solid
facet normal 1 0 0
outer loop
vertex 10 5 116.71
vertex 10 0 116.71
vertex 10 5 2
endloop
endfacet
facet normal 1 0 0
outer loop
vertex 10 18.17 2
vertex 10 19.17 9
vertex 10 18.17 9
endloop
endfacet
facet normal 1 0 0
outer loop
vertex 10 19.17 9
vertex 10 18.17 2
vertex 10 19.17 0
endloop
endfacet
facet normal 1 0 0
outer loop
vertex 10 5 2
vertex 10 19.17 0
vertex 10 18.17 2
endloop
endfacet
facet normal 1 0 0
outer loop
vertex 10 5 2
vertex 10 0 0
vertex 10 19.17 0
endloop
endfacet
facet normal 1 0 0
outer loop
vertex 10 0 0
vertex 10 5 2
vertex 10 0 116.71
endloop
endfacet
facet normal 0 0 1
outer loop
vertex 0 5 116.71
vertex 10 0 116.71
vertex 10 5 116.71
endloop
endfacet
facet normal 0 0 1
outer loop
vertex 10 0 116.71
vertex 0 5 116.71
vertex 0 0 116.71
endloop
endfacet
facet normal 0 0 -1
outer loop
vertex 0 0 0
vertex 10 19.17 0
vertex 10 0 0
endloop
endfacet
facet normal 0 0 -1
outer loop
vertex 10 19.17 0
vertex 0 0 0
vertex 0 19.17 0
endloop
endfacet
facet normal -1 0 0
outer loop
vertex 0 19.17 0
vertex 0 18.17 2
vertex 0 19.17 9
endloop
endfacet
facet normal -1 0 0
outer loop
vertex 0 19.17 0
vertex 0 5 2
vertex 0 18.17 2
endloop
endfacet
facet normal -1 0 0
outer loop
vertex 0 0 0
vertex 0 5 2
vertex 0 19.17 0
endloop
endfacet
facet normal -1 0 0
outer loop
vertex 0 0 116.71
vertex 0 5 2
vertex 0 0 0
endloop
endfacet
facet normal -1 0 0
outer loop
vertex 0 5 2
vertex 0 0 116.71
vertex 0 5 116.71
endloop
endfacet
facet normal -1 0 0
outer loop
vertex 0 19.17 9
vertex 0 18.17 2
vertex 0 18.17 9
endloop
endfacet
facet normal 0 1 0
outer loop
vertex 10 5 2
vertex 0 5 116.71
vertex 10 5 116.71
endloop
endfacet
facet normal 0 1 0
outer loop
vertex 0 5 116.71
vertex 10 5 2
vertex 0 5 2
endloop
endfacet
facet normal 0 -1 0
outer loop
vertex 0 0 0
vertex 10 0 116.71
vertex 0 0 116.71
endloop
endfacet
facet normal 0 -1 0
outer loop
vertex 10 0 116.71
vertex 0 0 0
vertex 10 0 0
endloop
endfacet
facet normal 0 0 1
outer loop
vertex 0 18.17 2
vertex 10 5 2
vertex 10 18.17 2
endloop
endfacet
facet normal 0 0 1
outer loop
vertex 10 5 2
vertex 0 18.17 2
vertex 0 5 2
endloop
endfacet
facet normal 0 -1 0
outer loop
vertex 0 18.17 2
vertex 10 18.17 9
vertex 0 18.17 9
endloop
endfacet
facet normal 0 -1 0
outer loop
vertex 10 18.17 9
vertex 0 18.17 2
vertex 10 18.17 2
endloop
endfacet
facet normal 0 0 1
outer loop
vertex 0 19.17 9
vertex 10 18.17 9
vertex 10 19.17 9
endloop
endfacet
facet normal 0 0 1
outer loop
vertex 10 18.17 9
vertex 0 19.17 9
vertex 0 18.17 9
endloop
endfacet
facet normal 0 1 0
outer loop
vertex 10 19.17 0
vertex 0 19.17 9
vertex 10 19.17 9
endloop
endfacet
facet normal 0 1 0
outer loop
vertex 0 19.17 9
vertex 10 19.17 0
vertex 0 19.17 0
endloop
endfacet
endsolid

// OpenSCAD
// file: ../box_module/lock.scad
include <config.scad>
use <utils.scad>


module lock_piece(tolerance = 0, max_height = -1) {
    assert(max_height != 0 && max_height >= -1);

    width_big = lock_width/1.65*1.2;
    width_small = lock_width/1.65*0.75;
    width_max = lock_width;

    points = [
        [0, -(width_small + tolerance)/2, -lock_depth],
        [0,  (width_small + tolerance)/2, -lock_depth],
        [lock_depth + tolerance,  (width_big + tolerance)/2, 0],
        [lock_depth + tolerance, -(width_big + tolerance)/2, 0],
        [0, -(width_small + tolerance)/2, 4/5*lock_body_height],
        [0,  (width_small + tolerance)/2, 4/5*lock_body_height],
        [lock_depth + tolerance,  (width_big + tolerance)/2, 4/5*lock_body_height],
        [lock_depth + tolerance, -(width_big + tolerance)/2, 4/5*lock_body_height],
        [0, -(width_big + tolerance)/2, lock_body_height],
        [0,  (width_big + tolerance)/2, lock_body_height],
        [lock_depth + tolerance,  (width_max + tolerance)/2, lock_body_height],
        [lock_depth + tolerance, -(width_max + tolerance)/2, lock_body_height],
    ];
    faces = [
        [0,1,2,3],  // bottom
        [4,5,1,0],  // front
        //[7,6,5,4],  // top
        [5,6,2,1],  // right
        [6,7,3,2],  // back
        [7,4,0,3], // left
        [8,9,5,4], // top front
        [11,10,9,8], // top top
        [9,10,6,5], // top right
        [10,11,7,6], // top back
        [11,8,4,7], // top left
    ];

    if (max_height != -1 && max_height < lock_height) {
        translate([0, 0, max_height - lock_height]) difference() {
            translate([0, 0, lock_depth])  polyhedron(points, faces);

            translate([0, -(width_max + tolerance)/2, 0]) cube([lock_depth + tolerance, width_max + tolerance, lock_height + tolerance - max_height]);
        }
    } else if (max_height > lock_height) {
        translate([0, 0, max_height - lock_body_height]) polyhedron(points, faces);
    } else {
        translate([0, 0, lock_depth]) polyhedron(points, faces);
    }
}


module lock_deprecated(lock_groove = false, max_height = -1) {
    tolerance = (lock_groove == true) ? tolerance : 0;

    for (a = [-lock_distance : lock_distance : lock_distance]) {
        translate([0, a, 0])
          lock_piece(tolerance = tolerance, max_height = max_height);
    }
}


module lock_module(height = -1, length = default_length) {
    height = (height == -1) ? lock_height : height;
    height_move = max(height - lock_body_height - lock_depth, 0);
    length_true = length - 2*rounding;

    module final() {
        difference() {
            quickMinkowski(rounding) cube([lock_module_width_true, length_true, height - 2*rounding]);

            translate([lock_module_width, 0, 0]) cube([rounding, length, height]);
        }

        translate([lock_module_width, length/2, height_move]) lock(max_height = height);
    }

    final();
}


function lock_length(pieces = lock_pieces, padding = 2/3*lock_distance) =
    (pieces-1) * lock_distance + 2*padding;


module key(pieces = lock_pieces, height = -1, padding = 2/3*lock_distance) {
    length = lock_length(pieces, padding);

    module part() {
        for (a = [-length/2 + padding : lock_distance : length/2 - padding]) {
            translate([0, a, 0]) lock_piece(max_height = height);
        }
    }

    rotate([0, 0, 180]) part();
}


module lock(pieces = lock_pieces, height = -1, padding = 2/3*lock_distance) {
    length = lock_length(pieces, padding);

    module part() {
        for (a = [-length/2 + padding : lock_distance : length/2 - padding]) {
            translate([0, a, 0]) lock_piece(tolerance = tolerance, max_height = height);
        }
    }

    part();
}
// file: ../box_module/utils.scad
module quickMinkowski(rounding) {
    translate([rounding, rounding, rounding]) minkowski() {
        children();
        sphere(r=rounding);
    }
}

module box(a, thickness) {
    inner_box_width = a[0] - 2*thickness;
    inner_box_length = a[1] - 2*thickness;
    inner_box_height = a[2] - thickness;

    difference() {
        cube(a);

        translate([thickness, thickness, thickness]) cube([inner_box_width, inner_box_length, inner_box_height]);
    }
}

module box_inner_size(a, thickness) {
    outer_box_width = a[0] + 2*thickness;
    outer_box_length = a[1] + 2*thickness;
    outer_box_height = a[2] + thickness;

    difference() {
        cube([outer_box_width, outer_box_length, outer_box_height]);

        translate([thickness, thickness, thickness]) cube(a);
    }
}
// file: ../box_module/config.scad
$fs = 0.6;

// user defined parameters
default_length = 100;
plane_thickness = 5;
side_thickness = 4;
table_depth = 20;
table_thickness = 20;
round_corners = true;
screw_size = 10;

//system parameters
tolerance = 0.2;
lock_height = 24;
lock_depth = 2;
lock_width = 6.6;
lock_distance = 25;
lock_pieces = 3;
lock_module_width = 2;
rounding = 1.5;

// computed parameters
lock_body_height = lock_height - lock_depth;
default_length_true = default_length - 2*rounding;
plane_thickness_true = plane_thickness - 2*rounding;
side_thickness_true = side_thickness - rounding;
table_depth_true = table_depth;
handle_depth = table_depth + plane_thickness;
handle_height = 2*plane_thickness + table_thickness + 2*rounding;
screw_type = str("M",screw_size);
lock_module_width_true = lock_module_width - rounding;
// file: ../box_module/Round-Anything/MinkowskiRound.scad
Skip to content
Search or jump to…

Pull requests
Issues
Marketplace
Explore
 
@TLC123 
Irev-Dev
/
Round-Anything
11
15915
Code
Issues
2
Pull requests
Discussions
Actions
Projects
Wiki
Security
Insights
Round-Anything/MinkowskiRound.scad

Kurt Hutten Mostly renaming for readability
Latest commit f4a75dd on 5 Aug 2020
 History
 1 contributor
113 lines (101 sloc)  3.56 KB
  
// Library: MinkowskiRound.scad
// Version: 1.0
// Author: IrevDev
// Copyright: 2020
// License: MIT

/*
---Modules
round2d(outside radius,internal radius) -> takes 2d children
This module will round 2d any shape
minkowskiRound(outsideRadius,internalRadius,enable,envelopecube[x,y,z]) -> takes 3d children
This module will round any 3d shape though it takes a long time, possibly more than 12 hours (use a low $fn value, 10-15 to begin with) so make sure enable is set to 0 untill you are ready for final render,the envelopecube must be bigger than the object you are rounding, default values are [500,500,500].
minkowskiOutsideRound(radius,enable,envelopecube[x,y,z])
minkowskiInsideRound(radius,enable,envelopecube[x,y,z])
Both this modules do the same thing as minkowskiRound() but focus on either inside or outside radiuses, which means these modules use one less minkowski() (two instead of three) making them quicker if you don't want both inside and outside radiuses.
--Examples
*/

//round2d(1,6)difference(){square([20,20]);square([10,10]);}
//minkowskiRound(3,1.5,1)theshape();
//minkowskiInsideRound(3,1)theshape();
//minkowskiOutsideRound(3,1)theshape();

//---good test child for examples
//module theshape(){//example shape
//    difference(){
//        cube([20,20,20]);
//        cube([10,10,10]);
//    }
//}

// $fn=20;
// minkowskiRound(0.7,1.5,1,[50,50,50])union(){//--example in the thiniverse thumbnail/main image
//   cube([6,6,22]);
//   rotate([30,45,10])cylinder(h=22,d=10);
// }//--I rendered this out with a $fn=25 and it took more than 12 hours on my computer


module round2d(OR=3,IR=1){
  offset(OR){
    offset(-IR-OR){
      offset(IR){
        children();
      }
    }
  }
}

module minkowskiRound(OR=1,IR=1,enable=1,boundingEnvelope=[500,500,500]){
  if(enable==0){//do nothing if not enabled
    children();
  } else {
    minkowski(){//expand the now positive shape back out
      difference(){//make the negative shape positive again
        cube(boundingEnvelope-[0.1,0.1,0.1],center=true);
        minkowski(){//expand the negative shape inwards
          difference(){//create a negative of the children
            cube(boundingEnvelope,center=true);
            minkowski(){//expand the children
              children();
              sphere(IR);
            }
          }
          sphere(OR+IR);
        }
      }
      sphere(OR);
    }
  }
}

module minkowskiOutsideRound(r=1,enable=1,boundingEnvelope=[500,500,500]){
  if(enable==0){//do nothing if not enabled
    children();
  } else {
    minkowski(){//expand the now positive shape
      difference(){//make the negative positive
        cube(boundingEnvelope-[0.1,0.1,0.1],center=true);
        minkowski(){//expand the negative inwards
          difference(){//create a negative of the children
            cube(boundingEnvelope,center=true);
            children();
          }
          sphere(r);
        }
      }
      sphere(r);
    }
  }
}

module minkowskiInsideRound(r=1,enable=1,boundingEnvelope=[500,500,500]){
  if(enable==0){//do nothing if not enabled
    children();
  } else {
    difference(){//make the negative positive again
      cube(boundingEnvelope-[0.1,0.1,0.1],center=true);
      minkowski(){//expand the negative shape inwards
        difference(){//make the expanded children a negative shape
          cube(boundingEnvelope,center=true);
          minkowski(){//expand the children
            children();
            sphere(r);
          }
        }
        sphere(r);
      }
    }
  }
}
module fast_minkowski_minkowski(padding) {
    intersection() {
        linear_extrude(100, center = true) {
            offset(delta = padding) projection() hull() children();
        }
        rotate(-[90, 0, 0]) linear_extrude(100, center = true) {
            offset(delta = padding) projection() rotate([90, 0, 0]) hull() children();
        }
        rotate(-[0, 90, 0]) linear_extrude(100, center = true) {
            offset(delta = padding) projection() rotate([0, 90, 0]) hull() children();
        }
    }
}
// file: ../box_module/box_module.scad
include <Round-Anything/MinkowskiRound.scad>

include <config.scad>
use <utils.scad>
use <lock.scad>

box_thickness = 4;
box_size = [60, 100, 30];


module box_module(box_size, box_thickness) {

    module shape() {
        minkowskiRound(rounding, rounding, enable=1, boundingEnvelope=2.2*box_size, $fs=1.0) {
            box(box_size, thickness=box_thickness);
        }
    }

    module final() {
        shape();

        translate([0, box_size[1]/2, rounding]) key(height = box_size[2]-2*rounding);
    }

    final();
}

box_module(box_size, box_thickness);
// main file
//Includes
use <../box_module/box_module.scad>

//Dimentions
//General Dimentions
x = 10;
y = 18.17;
z = 0;
thickness = 1;

//Back dimentions
back_x = x;
back_y = 5;
back_z = 116.71;
back_thickness = thickness;

//Bottom dimentions
bottom_x = x;
bottom_y = y;
bottom_z = 2;
bottom_thickness = thickness;

//Front dimentions
front_x = x;
front_y = 1;
front_z = 9;
front_thickness = thickness;
front_translate = [0, y, 0];

cube([back_x, back_y, back_z]);
cube([bottom_x, bottom_y, bottom_z]);
translate(front_translate){
	cube([front_x, front_y, front_z]);
}
